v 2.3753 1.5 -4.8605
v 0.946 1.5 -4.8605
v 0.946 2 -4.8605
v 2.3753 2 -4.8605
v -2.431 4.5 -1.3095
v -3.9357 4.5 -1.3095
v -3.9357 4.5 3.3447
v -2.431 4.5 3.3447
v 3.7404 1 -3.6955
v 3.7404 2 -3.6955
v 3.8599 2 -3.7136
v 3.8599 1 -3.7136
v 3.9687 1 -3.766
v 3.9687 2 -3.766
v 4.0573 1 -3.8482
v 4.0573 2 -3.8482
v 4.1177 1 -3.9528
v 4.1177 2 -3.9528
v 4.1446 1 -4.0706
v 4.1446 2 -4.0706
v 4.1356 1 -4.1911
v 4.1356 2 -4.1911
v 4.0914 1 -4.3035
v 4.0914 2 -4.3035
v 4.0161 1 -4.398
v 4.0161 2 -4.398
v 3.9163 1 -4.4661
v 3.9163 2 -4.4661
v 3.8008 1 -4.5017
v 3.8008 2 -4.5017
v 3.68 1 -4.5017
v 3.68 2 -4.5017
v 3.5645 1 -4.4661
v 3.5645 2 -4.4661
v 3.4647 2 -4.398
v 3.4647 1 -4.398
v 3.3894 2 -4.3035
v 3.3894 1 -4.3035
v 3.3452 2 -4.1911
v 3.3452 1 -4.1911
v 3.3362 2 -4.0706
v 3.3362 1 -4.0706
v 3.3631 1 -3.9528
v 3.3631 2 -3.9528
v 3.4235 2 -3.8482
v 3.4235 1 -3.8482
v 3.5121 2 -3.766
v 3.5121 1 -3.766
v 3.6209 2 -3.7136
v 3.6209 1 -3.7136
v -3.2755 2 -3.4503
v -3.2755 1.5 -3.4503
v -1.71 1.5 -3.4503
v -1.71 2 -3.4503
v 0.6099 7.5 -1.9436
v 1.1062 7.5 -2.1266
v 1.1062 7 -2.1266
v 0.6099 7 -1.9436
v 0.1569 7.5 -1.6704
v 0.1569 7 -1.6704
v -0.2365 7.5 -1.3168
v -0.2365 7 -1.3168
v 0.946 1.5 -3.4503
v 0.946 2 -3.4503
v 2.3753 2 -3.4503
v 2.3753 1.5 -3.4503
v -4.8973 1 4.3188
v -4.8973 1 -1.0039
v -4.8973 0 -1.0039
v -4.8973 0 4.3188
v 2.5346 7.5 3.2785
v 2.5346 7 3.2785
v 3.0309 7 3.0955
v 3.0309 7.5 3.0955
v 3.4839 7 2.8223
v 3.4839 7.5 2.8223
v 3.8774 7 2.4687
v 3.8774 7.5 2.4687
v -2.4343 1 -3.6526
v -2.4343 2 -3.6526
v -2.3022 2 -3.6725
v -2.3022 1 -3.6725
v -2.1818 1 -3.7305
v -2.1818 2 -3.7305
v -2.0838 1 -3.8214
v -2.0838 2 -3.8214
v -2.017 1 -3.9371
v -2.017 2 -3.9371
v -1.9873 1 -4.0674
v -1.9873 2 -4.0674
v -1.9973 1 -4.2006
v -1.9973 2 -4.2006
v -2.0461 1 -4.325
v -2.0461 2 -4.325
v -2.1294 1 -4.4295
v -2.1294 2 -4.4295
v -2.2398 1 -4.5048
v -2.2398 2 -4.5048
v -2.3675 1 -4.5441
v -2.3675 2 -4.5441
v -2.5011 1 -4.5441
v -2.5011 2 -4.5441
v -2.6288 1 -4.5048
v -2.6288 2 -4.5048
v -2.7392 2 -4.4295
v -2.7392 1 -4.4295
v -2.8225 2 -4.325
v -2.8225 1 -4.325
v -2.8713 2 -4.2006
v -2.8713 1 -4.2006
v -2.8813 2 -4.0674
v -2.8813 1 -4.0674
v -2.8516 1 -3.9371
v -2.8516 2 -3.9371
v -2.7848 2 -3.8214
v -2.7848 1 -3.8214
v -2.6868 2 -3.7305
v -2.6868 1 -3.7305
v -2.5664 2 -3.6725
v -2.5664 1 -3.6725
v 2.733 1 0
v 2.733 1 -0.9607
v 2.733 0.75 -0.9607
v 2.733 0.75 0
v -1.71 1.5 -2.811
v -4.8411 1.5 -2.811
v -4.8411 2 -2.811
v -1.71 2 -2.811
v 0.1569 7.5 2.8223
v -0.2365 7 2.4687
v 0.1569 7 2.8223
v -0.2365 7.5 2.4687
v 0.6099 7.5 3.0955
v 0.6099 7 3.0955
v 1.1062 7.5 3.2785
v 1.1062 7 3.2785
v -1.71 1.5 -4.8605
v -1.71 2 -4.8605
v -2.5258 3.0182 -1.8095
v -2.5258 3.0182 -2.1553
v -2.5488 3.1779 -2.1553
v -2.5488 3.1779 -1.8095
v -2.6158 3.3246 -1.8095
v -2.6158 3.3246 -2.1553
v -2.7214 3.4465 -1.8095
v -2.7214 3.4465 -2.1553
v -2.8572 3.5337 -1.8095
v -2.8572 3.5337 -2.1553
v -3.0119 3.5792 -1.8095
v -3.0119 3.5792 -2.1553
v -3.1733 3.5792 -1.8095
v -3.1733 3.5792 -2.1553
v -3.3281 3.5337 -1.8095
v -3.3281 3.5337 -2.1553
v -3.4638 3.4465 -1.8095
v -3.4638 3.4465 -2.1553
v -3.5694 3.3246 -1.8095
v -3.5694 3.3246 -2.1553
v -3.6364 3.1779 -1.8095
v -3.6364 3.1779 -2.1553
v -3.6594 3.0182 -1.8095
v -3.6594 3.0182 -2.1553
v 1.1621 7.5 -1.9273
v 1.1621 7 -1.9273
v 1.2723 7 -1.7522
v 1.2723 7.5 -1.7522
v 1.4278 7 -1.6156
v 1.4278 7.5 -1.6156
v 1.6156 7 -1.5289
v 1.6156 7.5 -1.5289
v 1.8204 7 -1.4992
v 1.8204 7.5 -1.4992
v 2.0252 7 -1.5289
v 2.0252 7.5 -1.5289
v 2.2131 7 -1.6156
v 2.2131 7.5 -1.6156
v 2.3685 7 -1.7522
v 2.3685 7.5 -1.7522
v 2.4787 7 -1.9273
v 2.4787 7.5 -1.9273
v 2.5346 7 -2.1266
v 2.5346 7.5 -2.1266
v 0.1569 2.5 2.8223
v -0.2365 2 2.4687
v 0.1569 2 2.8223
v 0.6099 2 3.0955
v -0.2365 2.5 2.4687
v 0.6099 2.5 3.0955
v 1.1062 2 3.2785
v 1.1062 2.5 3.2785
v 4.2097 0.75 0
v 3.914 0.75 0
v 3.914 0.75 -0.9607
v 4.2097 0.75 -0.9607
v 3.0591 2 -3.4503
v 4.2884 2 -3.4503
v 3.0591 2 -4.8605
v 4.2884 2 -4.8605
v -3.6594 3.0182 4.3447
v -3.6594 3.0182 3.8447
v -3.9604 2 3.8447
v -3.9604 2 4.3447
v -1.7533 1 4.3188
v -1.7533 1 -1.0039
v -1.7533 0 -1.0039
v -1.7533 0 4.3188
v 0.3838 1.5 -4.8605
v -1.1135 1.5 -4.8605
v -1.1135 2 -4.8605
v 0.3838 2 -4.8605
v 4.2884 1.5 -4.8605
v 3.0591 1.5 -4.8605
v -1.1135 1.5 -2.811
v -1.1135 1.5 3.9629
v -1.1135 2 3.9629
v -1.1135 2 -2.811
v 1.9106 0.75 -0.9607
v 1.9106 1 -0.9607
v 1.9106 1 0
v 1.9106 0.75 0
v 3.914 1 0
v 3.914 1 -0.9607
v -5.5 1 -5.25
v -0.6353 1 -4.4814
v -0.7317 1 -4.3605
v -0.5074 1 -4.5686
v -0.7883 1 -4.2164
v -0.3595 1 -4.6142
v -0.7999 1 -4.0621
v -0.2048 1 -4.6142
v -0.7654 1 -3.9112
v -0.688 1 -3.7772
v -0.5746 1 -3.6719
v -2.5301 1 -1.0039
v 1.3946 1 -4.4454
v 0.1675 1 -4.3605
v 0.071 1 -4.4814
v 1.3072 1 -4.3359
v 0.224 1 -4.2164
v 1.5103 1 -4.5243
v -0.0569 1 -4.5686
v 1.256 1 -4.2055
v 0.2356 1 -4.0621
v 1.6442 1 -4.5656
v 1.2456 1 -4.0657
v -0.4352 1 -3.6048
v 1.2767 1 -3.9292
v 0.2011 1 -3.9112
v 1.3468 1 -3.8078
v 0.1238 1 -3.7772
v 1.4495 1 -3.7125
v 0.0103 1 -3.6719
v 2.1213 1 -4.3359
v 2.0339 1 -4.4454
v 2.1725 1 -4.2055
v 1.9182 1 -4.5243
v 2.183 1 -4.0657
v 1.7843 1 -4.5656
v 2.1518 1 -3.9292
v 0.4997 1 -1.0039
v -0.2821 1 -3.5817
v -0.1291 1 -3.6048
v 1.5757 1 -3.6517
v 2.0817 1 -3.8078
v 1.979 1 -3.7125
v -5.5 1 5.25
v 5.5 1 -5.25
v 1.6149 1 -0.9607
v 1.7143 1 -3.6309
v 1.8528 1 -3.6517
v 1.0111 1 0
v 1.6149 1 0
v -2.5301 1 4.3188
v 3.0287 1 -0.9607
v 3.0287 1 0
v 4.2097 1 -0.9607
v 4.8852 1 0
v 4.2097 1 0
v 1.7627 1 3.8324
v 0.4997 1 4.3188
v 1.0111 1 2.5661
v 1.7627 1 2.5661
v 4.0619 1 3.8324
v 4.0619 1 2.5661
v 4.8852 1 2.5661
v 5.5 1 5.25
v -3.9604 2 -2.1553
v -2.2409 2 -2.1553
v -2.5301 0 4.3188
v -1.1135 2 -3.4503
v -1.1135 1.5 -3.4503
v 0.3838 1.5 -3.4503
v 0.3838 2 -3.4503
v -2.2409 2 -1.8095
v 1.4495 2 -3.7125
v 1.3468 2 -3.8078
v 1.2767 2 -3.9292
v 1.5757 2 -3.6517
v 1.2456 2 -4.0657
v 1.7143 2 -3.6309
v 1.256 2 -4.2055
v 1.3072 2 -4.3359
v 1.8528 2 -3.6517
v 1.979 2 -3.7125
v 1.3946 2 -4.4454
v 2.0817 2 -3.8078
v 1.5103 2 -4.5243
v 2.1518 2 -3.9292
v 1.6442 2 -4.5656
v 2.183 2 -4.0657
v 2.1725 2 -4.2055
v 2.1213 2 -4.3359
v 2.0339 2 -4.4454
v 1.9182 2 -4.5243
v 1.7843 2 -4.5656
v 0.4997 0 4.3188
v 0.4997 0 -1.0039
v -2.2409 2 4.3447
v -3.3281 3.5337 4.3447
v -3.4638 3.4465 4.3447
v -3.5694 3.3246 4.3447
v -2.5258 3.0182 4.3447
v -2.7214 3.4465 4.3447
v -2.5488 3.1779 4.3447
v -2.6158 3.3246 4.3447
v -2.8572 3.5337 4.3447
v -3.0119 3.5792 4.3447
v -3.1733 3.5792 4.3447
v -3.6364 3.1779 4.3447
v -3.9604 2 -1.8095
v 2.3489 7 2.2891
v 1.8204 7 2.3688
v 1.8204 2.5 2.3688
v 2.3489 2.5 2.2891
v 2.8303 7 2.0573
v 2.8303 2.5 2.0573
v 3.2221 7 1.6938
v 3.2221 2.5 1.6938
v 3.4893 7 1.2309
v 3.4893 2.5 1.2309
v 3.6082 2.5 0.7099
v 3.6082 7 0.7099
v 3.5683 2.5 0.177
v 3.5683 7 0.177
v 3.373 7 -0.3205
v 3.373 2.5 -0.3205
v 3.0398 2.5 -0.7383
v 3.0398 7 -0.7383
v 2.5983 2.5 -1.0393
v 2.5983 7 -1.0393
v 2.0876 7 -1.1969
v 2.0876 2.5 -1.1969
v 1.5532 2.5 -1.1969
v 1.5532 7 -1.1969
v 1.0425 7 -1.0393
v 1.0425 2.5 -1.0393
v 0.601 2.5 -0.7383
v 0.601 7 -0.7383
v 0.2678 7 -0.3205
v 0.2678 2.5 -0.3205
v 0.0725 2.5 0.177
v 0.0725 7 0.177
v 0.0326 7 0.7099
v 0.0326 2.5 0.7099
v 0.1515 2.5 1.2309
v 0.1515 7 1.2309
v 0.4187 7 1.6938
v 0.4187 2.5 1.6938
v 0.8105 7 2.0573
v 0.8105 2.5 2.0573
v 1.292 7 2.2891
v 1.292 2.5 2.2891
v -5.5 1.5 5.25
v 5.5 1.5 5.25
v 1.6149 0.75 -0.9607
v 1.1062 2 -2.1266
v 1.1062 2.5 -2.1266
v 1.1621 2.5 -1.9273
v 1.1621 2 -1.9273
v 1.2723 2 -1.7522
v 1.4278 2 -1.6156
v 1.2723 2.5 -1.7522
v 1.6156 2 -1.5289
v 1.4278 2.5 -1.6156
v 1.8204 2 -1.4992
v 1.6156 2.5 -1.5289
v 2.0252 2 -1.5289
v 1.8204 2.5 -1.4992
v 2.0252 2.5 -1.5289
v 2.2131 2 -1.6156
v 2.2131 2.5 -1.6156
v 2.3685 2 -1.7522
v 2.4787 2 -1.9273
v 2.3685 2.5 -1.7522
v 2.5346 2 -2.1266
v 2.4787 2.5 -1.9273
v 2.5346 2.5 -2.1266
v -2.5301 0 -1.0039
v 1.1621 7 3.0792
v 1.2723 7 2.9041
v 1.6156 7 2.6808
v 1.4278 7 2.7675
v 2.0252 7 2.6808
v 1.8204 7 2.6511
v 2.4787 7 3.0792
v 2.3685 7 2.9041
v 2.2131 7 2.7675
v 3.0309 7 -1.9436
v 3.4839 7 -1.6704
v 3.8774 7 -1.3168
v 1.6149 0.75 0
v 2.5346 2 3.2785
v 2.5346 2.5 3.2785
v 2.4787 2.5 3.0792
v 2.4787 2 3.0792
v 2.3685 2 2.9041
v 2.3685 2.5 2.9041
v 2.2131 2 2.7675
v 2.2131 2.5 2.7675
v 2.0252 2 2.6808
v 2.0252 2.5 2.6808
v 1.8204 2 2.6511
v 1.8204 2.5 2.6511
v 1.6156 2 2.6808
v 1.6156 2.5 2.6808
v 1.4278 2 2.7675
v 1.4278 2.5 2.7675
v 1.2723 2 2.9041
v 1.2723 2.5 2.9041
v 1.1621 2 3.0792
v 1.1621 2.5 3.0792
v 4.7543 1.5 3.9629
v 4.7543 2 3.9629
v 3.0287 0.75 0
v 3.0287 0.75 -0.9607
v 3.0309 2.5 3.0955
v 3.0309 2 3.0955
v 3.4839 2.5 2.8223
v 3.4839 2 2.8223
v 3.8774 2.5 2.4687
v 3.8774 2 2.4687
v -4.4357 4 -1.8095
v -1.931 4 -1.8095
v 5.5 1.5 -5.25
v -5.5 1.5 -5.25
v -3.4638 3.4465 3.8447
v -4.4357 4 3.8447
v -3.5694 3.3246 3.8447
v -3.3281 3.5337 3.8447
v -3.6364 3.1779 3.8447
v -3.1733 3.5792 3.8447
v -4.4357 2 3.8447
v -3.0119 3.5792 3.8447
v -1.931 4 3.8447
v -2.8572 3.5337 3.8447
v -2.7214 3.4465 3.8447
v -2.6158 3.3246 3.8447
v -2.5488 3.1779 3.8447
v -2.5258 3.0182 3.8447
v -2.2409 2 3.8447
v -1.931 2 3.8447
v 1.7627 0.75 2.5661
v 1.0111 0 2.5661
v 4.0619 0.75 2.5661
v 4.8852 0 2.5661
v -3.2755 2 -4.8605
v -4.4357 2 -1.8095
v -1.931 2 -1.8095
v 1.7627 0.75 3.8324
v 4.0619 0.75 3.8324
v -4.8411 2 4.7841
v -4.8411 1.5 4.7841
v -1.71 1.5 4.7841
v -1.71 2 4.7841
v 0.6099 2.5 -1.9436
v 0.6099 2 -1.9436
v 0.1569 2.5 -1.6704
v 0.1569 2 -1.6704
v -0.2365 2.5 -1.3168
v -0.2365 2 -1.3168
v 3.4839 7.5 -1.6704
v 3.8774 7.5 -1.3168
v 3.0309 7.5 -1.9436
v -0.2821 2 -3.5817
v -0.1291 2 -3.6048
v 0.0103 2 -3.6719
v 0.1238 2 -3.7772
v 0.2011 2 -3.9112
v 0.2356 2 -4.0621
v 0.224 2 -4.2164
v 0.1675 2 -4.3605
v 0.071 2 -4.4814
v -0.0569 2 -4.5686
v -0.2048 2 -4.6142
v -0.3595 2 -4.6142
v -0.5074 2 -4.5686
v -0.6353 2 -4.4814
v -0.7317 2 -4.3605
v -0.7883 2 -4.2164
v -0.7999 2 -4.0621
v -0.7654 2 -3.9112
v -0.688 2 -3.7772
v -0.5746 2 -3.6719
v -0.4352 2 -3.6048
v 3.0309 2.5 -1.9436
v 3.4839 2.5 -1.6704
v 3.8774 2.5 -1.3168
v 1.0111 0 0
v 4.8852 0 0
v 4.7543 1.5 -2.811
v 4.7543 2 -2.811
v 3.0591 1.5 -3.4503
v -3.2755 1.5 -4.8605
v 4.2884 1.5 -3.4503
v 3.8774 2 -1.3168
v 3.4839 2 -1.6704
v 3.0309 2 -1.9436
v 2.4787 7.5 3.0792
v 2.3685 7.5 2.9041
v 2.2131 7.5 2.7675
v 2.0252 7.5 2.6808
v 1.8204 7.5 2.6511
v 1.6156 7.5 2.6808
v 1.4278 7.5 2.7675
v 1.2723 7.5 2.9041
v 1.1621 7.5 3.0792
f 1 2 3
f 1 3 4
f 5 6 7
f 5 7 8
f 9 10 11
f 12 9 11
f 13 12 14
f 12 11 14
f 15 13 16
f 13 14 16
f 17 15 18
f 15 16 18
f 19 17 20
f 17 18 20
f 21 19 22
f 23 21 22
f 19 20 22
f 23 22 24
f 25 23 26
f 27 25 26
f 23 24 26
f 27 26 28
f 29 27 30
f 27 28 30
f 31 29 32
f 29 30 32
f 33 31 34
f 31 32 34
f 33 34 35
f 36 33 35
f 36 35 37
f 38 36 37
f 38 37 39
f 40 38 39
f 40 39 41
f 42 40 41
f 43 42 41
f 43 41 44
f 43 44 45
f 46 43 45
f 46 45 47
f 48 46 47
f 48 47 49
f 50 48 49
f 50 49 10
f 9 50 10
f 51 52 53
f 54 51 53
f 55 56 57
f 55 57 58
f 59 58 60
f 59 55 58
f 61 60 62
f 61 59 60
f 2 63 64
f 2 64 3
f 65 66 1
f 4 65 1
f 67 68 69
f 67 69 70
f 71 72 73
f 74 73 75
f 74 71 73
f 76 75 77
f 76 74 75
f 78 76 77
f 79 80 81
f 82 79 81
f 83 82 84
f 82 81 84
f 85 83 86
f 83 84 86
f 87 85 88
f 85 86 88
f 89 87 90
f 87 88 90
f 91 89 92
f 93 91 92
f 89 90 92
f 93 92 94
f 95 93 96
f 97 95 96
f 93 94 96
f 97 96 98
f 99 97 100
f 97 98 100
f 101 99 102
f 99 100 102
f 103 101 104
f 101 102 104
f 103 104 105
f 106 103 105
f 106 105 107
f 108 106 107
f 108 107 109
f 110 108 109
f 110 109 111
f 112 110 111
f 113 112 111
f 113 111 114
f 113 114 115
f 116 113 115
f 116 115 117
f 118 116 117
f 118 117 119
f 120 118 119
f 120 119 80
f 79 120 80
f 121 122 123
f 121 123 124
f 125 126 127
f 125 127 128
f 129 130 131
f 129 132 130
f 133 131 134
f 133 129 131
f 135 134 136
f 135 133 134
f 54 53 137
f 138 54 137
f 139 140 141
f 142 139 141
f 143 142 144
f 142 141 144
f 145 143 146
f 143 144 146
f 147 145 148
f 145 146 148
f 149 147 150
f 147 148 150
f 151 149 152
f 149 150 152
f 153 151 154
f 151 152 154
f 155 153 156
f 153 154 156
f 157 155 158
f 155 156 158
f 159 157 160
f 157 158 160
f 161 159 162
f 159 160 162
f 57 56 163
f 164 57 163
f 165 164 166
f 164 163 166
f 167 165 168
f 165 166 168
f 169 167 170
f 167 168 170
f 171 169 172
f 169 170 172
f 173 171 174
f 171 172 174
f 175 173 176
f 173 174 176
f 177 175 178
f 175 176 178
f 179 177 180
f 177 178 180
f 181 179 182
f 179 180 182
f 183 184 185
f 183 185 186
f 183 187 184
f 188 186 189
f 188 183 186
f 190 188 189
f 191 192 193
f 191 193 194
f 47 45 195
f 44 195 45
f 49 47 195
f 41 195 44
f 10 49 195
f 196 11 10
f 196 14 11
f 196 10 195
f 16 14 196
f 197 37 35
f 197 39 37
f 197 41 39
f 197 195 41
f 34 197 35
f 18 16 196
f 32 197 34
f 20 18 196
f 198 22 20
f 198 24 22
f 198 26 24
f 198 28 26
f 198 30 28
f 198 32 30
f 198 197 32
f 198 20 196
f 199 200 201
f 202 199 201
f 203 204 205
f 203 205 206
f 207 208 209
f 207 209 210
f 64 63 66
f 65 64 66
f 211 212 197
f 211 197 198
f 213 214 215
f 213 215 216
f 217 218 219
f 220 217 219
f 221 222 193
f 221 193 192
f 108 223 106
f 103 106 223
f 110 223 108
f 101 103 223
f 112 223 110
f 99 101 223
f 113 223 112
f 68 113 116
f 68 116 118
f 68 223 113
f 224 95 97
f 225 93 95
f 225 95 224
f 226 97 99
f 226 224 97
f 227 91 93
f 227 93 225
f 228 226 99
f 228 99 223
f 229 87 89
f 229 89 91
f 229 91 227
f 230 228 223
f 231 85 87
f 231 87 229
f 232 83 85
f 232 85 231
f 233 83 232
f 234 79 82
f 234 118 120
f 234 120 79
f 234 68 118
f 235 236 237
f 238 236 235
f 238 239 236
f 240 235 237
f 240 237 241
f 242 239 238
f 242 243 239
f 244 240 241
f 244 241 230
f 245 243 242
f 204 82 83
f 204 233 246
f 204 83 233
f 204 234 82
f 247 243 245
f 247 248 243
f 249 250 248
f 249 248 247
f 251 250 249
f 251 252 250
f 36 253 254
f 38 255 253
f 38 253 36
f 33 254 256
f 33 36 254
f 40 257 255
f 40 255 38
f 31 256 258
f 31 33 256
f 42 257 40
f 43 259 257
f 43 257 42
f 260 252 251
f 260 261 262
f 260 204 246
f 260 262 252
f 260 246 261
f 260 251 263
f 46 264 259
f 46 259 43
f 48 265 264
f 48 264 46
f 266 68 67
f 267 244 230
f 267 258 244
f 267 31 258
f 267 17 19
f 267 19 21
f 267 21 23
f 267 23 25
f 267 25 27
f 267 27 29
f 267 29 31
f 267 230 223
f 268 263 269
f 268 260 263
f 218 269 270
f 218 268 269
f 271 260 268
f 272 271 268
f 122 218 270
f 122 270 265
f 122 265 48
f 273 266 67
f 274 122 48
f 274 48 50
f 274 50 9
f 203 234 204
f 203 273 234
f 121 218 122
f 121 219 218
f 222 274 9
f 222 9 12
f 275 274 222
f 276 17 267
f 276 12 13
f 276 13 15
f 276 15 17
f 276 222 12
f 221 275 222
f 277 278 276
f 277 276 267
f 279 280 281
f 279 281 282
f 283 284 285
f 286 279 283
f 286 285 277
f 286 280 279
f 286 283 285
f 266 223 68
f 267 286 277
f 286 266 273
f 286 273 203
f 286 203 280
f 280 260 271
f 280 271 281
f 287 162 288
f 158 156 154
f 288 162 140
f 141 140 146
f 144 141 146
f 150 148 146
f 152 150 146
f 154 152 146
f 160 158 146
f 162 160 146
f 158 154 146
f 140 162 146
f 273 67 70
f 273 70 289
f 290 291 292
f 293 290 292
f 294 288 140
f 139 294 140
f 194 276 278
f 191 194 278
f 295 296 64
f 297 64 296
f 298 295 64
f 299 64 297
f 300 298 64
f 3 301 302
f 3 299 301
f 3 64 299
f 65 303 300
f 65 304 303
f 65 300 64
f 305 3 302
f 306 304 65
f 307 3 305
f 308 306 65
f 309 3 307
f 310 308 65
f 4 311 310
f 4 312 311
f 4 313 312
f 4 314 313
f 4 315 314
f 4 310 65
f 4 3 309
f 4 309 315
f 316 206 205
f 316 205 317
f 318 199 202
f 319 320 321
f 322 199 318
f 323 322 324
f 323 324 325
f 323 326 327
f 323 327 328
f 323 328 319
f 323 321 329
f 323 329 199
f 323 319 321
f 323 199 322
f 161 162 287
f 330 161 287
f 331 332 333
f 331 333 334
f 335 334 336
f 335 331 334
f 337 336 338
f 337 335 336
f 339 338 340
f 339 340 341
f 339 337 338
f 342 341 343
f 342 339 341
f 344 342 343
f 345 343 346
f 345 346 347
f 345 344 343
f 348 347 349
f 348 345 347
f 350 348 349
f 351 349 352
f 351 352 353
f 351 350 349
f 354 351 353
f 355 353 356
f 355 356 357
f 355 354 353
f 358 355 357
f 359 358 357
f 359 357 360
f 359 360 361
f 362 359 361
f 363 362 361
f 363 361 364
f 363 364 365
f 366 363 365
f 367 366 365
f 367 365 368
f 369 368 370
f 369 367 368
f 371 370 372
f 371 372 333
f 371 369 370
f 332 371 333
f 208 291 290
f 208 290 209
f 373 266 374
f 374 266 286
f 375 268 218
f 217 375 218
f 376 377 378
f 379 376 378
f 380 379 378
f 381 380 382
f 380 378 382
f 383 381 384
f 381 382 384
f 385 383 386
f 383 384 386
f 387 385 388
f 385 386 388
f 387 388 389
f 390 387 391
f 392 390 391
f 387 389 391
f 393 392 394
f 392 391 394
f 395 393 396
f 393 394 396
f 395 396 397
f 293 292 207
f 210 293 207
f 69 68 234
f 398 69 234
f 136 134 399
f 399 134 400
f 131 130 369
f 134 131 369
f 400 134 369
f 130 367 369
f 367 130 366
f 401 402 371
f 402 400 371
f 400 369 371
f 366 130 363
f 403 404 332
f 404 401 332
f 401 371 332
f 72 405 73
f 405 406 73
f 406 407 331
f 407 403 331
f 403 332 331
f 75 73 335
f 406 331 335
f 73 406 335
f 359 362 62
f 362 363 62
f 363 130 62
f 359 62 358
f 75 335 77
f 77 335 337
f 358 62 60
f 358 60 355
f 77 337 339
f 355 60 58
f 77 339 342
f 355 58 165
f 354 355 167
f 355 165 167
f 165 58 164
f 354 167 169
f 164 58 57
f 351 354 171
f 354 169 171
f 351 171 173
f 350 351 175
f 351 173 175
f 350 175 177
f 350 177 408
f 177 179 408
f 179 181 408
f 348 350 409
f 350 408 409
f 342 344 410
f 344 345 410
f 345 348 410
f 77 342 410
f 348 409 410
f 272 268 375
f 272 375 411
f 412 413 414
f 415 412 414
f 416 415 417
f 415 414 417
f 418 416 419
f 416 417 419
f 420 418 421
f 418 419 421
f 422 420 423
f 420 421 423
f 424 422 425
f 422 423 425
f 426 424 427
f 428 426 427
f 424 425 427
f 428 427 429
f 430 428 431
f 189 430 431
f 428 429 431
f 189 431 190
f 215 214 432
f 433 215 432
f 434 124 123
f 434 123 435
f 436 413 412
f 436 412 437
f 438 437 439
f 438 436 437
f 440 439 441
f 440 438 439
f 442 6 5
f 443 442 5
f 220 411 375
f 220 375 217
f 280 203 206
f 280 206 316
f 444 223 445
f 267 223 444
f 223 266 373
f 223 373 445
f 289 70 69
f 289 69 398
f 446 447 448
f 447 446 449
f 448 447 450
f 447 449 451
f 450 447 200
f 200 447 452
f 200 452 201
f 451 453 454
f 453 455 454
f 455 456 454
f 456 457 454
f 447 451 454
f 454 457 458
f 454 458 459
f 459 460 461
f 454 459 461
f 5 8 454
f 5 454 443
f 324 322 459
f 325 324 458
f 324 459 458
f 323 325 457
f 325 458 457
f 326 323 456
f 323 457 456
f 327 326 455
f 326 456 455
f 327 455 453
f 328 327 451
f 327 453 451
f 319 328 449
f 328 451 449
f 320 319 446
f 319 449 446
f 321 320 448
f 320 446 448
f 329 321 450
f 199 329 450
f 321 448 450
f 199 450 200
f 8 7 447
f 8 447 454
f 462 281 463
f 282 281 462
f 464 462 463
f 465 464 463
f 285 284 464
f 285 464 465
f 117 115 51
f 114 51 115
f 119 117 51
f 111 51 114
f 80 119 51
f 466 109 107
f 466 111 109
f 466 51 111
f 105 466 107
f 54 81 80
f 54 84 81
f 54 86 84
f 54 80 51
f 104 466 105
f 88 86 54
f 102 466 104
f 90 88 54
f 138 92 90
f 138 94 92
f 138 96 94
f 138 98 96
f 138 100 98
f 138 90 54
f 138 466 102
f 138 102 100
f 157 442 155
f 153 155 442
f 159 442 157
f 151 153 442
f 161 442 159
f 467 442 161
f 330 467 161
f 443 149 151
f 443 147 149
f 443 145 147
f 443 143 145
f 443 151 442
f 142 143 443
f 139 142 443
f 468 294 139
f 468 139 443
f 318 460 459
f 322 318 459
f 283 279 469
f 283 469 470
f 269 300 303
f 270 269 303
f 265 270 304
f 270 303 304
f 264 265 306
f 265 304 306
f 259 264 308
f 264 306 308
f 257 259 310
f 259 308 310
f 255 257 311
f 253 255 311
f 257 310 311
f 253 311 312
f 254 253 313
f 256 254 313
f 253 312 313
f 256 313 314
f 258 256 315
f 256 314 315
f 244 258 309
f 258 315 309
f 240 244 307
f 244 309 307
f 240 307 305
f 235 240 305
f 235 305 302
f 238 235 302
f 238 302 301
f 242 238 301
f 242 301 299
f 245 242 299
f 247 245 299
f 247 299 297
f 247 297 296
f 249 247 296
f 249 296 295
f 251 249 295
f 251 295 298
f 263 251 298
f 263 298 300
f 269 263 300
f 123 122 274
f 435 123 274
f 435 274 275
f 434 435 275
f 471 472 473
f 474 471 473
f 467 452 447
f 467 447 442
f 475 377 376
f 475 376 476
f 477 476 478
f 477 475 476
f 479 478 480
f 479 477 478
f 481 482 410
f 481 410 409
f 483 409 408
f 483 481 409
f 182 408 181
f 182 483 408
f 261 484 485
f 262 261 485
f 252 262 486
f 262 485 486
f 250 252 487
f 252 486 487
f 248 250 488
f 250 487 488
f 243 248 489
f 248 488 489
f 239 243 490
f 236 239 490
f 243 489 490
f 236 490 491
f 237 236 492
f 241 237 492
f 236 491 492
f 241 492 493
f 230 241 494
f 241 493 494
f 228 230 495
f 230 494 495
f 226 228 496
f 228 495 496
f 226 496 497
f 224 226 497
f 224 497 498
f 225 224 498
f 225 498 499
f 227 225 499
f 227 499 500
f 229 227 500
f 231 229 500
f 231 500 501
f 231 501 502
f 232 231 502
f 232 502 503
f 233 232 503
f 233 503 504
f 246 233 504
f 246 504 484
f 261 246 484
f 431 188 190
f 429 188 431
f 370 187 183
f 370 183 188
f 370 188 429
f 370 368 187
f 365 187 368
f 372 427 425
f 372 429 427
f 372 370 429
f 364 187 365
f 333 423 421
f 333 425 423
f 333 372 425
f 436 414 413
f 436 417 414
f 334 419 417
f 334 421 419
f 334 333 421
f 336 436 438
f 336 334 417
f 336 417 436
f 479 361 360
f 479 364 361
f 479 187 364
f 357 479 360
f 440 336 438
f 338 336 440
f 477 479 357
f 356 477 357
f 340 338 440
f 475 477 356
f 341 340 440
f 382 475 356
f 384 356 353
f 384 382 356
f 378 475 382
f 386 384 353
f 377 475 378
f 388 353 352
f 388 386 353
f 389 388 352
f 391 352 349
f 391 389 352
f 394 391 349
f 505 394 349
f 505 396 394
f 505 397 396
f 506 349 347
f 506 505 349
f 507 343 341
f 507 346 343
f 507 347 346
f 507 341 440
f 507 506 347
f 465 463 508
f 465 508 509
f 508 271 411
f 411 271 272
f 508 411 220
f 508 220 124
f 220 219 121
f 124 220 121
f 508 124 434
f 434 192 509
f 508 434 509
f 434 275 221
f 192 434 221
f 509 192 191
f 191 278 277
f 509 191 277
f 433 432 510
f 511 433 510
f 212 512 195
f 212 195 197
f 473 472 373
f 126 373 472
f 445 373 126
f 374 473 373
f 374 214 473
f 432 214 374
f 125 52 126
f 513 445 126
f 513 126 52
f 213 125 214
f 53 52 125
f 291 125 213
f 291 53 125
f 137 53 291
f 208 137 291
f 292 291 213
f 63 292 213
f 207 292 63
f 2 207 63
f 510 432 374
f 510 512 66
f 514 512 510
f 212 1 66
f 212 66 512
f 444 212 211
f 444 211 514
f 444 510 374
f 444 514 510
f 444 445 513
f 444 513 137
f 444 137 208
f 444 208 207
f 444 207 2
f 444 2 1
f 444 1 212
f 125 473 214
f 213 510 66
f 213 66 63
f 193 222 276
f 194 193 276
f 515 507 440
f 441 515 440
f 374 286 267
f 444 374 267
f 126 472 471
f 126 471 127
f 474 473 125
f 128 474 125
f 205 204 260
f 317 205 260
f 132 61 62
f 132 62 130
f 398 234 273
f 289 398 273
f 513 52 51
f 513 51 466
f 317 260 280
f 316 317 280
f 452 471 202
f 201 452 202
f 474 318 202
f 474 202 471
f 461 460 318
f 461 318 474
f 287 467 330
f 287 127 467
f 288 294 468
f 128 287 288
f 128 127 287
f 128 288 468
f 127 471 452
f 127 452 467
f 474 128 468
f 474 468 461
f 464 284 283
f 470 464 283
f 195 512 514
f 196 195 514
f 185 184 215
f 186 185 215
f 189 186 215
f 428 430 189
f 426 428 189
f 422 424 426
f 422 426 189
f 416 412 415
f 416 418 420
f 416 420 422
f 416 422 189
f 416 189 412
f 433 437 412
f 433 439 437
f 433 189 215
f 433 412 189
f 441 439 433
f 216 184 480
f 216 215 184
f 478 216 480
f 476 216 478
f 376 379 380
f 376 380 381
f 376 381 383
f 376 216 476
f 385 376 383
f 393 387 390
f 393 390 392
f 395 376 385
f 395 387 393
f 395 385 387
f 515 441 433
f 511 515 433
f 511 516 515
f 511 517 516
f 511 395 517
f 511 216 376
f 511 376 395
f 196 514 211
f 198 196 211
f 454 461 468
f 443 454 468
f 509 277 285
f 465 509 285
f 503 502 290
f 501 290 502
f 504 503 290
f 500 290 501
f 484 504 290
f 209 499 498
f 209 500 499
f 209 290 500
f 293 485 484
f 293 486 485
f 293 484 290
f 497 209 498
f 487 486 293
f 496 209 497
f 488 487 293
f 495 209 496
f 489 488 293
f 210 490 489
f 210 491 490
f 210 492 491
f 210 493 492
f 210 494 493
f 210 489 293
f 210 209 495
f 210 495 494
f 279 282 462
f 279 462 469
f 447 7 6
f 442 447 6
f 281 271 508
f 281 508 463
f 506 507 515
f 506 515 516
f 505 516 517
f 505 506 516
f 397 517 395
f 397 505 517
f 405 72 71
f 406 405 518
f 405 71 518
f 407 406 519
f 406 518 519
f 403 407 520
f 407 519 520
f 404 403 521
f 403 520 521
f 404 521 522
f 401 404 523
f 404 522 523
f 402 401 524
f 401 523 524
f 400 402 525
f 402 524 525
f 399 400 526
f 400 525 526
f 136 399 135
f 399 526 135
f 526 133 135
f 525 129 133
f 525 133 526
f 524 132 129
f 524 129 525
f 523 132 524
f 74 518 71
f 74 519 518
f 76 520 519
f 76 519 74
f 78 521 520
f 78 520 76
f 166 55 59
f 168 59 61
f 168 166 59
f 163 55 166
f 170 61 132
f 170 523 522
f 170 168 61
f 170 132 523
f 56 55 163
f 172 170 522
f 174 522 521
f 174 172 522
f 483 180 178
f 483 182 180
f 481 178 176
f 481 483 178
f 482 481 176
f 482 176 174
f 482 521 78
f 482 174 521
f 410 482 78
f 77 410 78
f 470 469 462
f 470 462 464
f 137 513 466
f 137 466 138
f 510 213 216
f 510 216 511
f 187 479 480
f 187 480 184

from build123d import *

# Parameters (mm, degrees)
SKETCH1_W                = 11
SKETCH1_H                = 10.5
BOSS_EXTRUDE1_DEPTH      = 7.5
SKETCH2_W                = 11
SKETCH2_H                = 10.5
SKETCH2_R                = 2.795278083
CUT_EXTRUDE1_DEPTH       = 6
CUT_EXTRUDE2_DEPTH       = 6
SKETCH5_W                = 5.867744682
SKETCH5_H                = 6.773951876
SKETCH5_W_2              = 3.131118199
SKETCH5_H_2              = 7.595162723
SKETCH5_W_3              = 1.565559099
SKETCH5_H_3              = 1.410160094
SKETCH5_W_4              = 1.497318165
SKETCH5_W_5              = 1.429294678
SKETCH5_W_6              = 1.22939712
BOSS_EXTRUDE2_DEPTH      = 0.5
SKETCH6_R                = 0.720165483
CUT_EXTRUDE3_DEPTH       = 5.5
CUT_EXTRUDE4_START       = -0.5
SKETCH7_W                = 6.315969547
SKETCH7_H                = 7.313839146
SKETCH7_R                = 1.792834501
CUT_EXTRUDE4_DEPTH       = 4.5
SKETCH8_W                = 2.504754688
SKETCH8_H                = 5.654171149
BOSS_EXTRUDE3_DEPTH      = 2.5
CHAMFER1_SIZE            = 0.5
BOSS_EXTRUDE4_DEPTH      = 0.5
BOSS_EXTRUDE4_DEPTH_BACK = 6
SKETCH11_R               = 0.448273795
SKETCH11_R_2             = 0.519161878
SKETCH11_R_3             = 0.470017501
SKETCH11_R_4             = 0.405329815
CUT_EXTRUDE5_DEPTH       = 6
SKETCH12_W               = 15.986280265
SKETCH12_H               = 22.221265256
CUT_EXTRUDE6_DEPTH       = 1
SKETCH14_W               = 2.367247422
SKETCH14_H               = 5.32267157
SKETCH14_W_2             = 2.25297781
SKETCH14_W_3             = 3.874113275
SKETCH14_H_2             = 2.566072862
BOSS_EXTRUDE5_DEPTH      = 1
SKETCH15_W               = 0.295662385
SKETCH15_H               = 1.277257847
SKETCH15_W_2             = 2.29913968
SKETCH15_H_2             = 1.589846546
BOSS_EXTRUDE6_DEPTH      = 0.25


with BuildPart() as part:
    # Sketch1 → Boss-Extrude1 (new body)
    with BuildSketch(Plane(origin=(0, 0, 0), x_dir=(1, 0, 0), z_dir=(0, 1, 0))):
        Rectangle(SKETCH1_W, SKETCH1_H)
    extrude(amount=BOSS_EXTRUDE1_DEPTH)

    # Sketch2 → Cut-Extrude1 (cut)
    with BuildSketch(Plane(origin=(0, 7.5, 0), x_dir=(1, 0, 0), z_dir=(0, 1, 0))):
        Rectangle(SKETCH2_W, SKETCH2_H)
        with Locations(Location((1.820403911, -0.575947, 0), (0, 0, 270))):
            Circle(SKETCH2_R, mode=Mode.SUBTRACT)
    extrude(amount=-CUT_EXTRUDE1_DEPTH, mode=Mode.SUBTRACT)

    # Sketch4 → Cut-Extrude2 (cut)
    with BuildSketch(Plane(origin=(0, 7.5, 0), x_dir=(1, 0, 0), z_dir=(0, 1, 0))):
        with BuildLine():
            Line((3.877357483, 1.31680802), (3.877357483, -2.46870202))
            ThreePointArc((3.877357483, -2.46870202), (4.615681994, -0.575947), (3.877357483, 1.31680802))
        make_face()
        with BuildLine():
            Line((-0.236549661, 1.31680802), (-0.236549661, -2.46870202))
            ThreePointArc((-0.236549661, -2.46870202), (-0.974874172, -0.575947), (-0.236549661, 1.31680802))
        make_face()
    extrude(amount=-CUT_EXTRUDE2_DEPTH, mode=Mode.SUBTRACT)

    # Sketch5 → Boss-Extrude2 (add)
    with BuildSketch(Plane(origin=(0, 1.5, 0), x_dir=(1, 0, 0), z_dir=(0, 1, 0))):
        with Locations((1.820403911, -0.575947)):
            Rectangle(SKETCH5_W, SKETCH5_H)
        with Locations((-3.275534534, -0.986552423)):
            Rectangle(SKETCH5_W_2, SKETCH5_H_2)
        with Locations((-2.492754984, 4.155418326)):
            Rectangle(SKETCH5_W_3, SKETCH5_H_3)
        with Locations((-0.364809348, 4.155418326)):
            Rectangle(SKETCH5_W_4, SKETCH5_H_3)
        with Locations((1.660671656, 4.155418326)):
            Rectangle(SKETCH5_W_5, SKETCH5_H_3)
        with Locations((3.673751281, 4.155418326)):
            Rectangle(SKETCH5_W_6, SKETCH5_H_3)
    extrude(amount=BOSS_EXTRUDE2_DEPTH)

    # Sketch6 → Cut-Extrude3 (cut)
    with BuildSketch(Plane(origin=(0, 7.5, 0), x_dir=(1, 0, 0), z_dir=(0, 1, 0))):
        with Locations((1.820403911, 2.219331083)):
            Circle(SKETCH6_R)
        with Locations((1.820403911, -3.371225083)):
            Circle(SKETCH6_R)
    extrude(amount=-CUT_EXTRUDE3_DEPTH, mode=Mode.SUBTRACT)

    # Sketch7 → Cut-Extrude4 (cut)
    with BuildSketch(Plane(origin=(0, 7.5, 0), x_dir=(1, 0, 0), z_dir=(0, 1, 0)).offset(CUT_EXTRUDE4_START)):
        with Locations((2.565041423, -0.688586972)):
            Rectangle(SKETCH7_W, SKETCH7_H)
        with Locations(Location((1.820403911, -0.575947, 0), (0, 0, 270))):
            Circle(SKETCH7_R, mode=Mode.SUBTRACT)
    extrude(amount=-CUT_EXTRUDE4_DEPTH, mode=Mode.SUBTRACT)

    # Sketch8 → Boss-Extrude3 (add)
    with BuildSketch(Plane(origin=(0, 2, 0), x_dir=(1, 0, 0), z_dir=(0, 1, 0))):
        with Locations((-3.183335966, -1.017589679)):
            Rectangle(SKETCH8_W, SKETCH8_H)
    extrude(amount=BOSS_EXTRUDE3_DEPTH)

    # Chamfer1
    chamfer1_edges = [part.edges().sort_by_distance(p)[0] for p in [
        (-4.43571331, 4.5, 1.017589679),
        (-3.183335966, 4.5, 3.844675254),
        (-1.930958622, 4.5, 1.017589679),
        (-3.183335966, 4.5, -1.809495895),
    ]]
    chamfer(chamfer1_edges, length=CHAMFER1_SIZE)

    # Sketch9 → Boss-Extrude4 (add, two sides: drawn at the far end of the back side and taken through both)
    with BuildSketch(Plane.XY.offset(3.844675254).offset(-BOSS_EXTRUDE4_DEPTH_BACK)):
        with BuildLine():
            Line((-3.65938344, 3.018172096), (-3.960413084, 2))
            Line((-3.960413084, 2), (-2.240880522, 2))
            Line((-2.240880522, 2), (-2.525820591, 3.018172096))
            ThreePointArc((-2.525820591, 3.018172096), (-3.092602015, 3.584953521), (-3.65938344, 3.018172096))
        make_face()
    extrude(amount=BOSS_EXTRUDE4_DEPTH + BOSS_EXTRUDE4_DEPTH_BACK)

    # Sketch11 → Cut-Extrude5 (cut)
    with BuildSketch(Plane(origin=(0, 2, 0), x_dir=(1, 0, 0), z_dir=(0, 1, 0))):
        with Locations(Location((-2.434309819, 4.1008725, 0), (0, 0, 270))):
            Circle(SKETCH11_R)
        with Locations(Location((-0.282142489, 4.1008725, 0), (0, 0, 270))):
            Circle(SKETCH11_R_2)
        with Locations(Location((1.714254577, 4.1008725, 0), (0, 0, 270))):
            Circle(SKETCH11_R_3)
        with Locations(Location((3.740407892, 4.1008725, 0), (0, 0, 270))):
            Circle(SKETCH11_R_4)
    extrude(amount=-CUT_EXTRUDE5_DEPTH, mode=Mode.SUBTRACT)

    # Sketch12 → Cut-Extrude6 (cut)
    with BuildSketch(Plane.XZ):
        with Locations((0.612445896, -2.778297047)):
            Rectangle(SKETCH12_W, SKETCH12_H)
    extrude(amount=-CUT_EXTRUDE6_DEPTH, mode=Mode.SUBTRACT)

    # Sketch14 → Boss-Extrude5 (add)
    with BuildSketch(Plane.XZ.offset(-1)):
        with Locations((-3.713682192, 1.657442308)):
            Rectangle(SKETCH14_W, SKETCH14_H)
        with Locations((-0.626830267, 1.657442308)):
            Rectangle(SKETCH14_W_2, SKETCH14_H)
        with Locations((2.948180384, 1.283036431)):
            Rectangle(SKETCH14_W_3, SKETCH14_H_2)
    extrude(amount=BOSS_EXTRUDE5_DEPTH)

    # Sketch15 → Boss-Extrude6 (add)
    with BuildSketch(Plane.XZ.offset(-1)):
        with Locations((1.762732856, -0.322099443)):
            Rectangle(SKETCH15_W, SKETCH15_H)
        with Locations((2.880831271, -0.322099443)):
            Rectangle(SKETCH15_W, SKETCH15_H)
        with Locations((4.061872536, -0.322099443)):
            Rectangle(SKETCH15_W, SKETCH15_H)
        with Locations((2.912302696, 3.03749296)):
            Rectangle(SKETCH15_W_2, SKETCH15_H_2)
    extrude(amount=BOSS_EXTRUDE6_DEPTH)


solid = part.part
